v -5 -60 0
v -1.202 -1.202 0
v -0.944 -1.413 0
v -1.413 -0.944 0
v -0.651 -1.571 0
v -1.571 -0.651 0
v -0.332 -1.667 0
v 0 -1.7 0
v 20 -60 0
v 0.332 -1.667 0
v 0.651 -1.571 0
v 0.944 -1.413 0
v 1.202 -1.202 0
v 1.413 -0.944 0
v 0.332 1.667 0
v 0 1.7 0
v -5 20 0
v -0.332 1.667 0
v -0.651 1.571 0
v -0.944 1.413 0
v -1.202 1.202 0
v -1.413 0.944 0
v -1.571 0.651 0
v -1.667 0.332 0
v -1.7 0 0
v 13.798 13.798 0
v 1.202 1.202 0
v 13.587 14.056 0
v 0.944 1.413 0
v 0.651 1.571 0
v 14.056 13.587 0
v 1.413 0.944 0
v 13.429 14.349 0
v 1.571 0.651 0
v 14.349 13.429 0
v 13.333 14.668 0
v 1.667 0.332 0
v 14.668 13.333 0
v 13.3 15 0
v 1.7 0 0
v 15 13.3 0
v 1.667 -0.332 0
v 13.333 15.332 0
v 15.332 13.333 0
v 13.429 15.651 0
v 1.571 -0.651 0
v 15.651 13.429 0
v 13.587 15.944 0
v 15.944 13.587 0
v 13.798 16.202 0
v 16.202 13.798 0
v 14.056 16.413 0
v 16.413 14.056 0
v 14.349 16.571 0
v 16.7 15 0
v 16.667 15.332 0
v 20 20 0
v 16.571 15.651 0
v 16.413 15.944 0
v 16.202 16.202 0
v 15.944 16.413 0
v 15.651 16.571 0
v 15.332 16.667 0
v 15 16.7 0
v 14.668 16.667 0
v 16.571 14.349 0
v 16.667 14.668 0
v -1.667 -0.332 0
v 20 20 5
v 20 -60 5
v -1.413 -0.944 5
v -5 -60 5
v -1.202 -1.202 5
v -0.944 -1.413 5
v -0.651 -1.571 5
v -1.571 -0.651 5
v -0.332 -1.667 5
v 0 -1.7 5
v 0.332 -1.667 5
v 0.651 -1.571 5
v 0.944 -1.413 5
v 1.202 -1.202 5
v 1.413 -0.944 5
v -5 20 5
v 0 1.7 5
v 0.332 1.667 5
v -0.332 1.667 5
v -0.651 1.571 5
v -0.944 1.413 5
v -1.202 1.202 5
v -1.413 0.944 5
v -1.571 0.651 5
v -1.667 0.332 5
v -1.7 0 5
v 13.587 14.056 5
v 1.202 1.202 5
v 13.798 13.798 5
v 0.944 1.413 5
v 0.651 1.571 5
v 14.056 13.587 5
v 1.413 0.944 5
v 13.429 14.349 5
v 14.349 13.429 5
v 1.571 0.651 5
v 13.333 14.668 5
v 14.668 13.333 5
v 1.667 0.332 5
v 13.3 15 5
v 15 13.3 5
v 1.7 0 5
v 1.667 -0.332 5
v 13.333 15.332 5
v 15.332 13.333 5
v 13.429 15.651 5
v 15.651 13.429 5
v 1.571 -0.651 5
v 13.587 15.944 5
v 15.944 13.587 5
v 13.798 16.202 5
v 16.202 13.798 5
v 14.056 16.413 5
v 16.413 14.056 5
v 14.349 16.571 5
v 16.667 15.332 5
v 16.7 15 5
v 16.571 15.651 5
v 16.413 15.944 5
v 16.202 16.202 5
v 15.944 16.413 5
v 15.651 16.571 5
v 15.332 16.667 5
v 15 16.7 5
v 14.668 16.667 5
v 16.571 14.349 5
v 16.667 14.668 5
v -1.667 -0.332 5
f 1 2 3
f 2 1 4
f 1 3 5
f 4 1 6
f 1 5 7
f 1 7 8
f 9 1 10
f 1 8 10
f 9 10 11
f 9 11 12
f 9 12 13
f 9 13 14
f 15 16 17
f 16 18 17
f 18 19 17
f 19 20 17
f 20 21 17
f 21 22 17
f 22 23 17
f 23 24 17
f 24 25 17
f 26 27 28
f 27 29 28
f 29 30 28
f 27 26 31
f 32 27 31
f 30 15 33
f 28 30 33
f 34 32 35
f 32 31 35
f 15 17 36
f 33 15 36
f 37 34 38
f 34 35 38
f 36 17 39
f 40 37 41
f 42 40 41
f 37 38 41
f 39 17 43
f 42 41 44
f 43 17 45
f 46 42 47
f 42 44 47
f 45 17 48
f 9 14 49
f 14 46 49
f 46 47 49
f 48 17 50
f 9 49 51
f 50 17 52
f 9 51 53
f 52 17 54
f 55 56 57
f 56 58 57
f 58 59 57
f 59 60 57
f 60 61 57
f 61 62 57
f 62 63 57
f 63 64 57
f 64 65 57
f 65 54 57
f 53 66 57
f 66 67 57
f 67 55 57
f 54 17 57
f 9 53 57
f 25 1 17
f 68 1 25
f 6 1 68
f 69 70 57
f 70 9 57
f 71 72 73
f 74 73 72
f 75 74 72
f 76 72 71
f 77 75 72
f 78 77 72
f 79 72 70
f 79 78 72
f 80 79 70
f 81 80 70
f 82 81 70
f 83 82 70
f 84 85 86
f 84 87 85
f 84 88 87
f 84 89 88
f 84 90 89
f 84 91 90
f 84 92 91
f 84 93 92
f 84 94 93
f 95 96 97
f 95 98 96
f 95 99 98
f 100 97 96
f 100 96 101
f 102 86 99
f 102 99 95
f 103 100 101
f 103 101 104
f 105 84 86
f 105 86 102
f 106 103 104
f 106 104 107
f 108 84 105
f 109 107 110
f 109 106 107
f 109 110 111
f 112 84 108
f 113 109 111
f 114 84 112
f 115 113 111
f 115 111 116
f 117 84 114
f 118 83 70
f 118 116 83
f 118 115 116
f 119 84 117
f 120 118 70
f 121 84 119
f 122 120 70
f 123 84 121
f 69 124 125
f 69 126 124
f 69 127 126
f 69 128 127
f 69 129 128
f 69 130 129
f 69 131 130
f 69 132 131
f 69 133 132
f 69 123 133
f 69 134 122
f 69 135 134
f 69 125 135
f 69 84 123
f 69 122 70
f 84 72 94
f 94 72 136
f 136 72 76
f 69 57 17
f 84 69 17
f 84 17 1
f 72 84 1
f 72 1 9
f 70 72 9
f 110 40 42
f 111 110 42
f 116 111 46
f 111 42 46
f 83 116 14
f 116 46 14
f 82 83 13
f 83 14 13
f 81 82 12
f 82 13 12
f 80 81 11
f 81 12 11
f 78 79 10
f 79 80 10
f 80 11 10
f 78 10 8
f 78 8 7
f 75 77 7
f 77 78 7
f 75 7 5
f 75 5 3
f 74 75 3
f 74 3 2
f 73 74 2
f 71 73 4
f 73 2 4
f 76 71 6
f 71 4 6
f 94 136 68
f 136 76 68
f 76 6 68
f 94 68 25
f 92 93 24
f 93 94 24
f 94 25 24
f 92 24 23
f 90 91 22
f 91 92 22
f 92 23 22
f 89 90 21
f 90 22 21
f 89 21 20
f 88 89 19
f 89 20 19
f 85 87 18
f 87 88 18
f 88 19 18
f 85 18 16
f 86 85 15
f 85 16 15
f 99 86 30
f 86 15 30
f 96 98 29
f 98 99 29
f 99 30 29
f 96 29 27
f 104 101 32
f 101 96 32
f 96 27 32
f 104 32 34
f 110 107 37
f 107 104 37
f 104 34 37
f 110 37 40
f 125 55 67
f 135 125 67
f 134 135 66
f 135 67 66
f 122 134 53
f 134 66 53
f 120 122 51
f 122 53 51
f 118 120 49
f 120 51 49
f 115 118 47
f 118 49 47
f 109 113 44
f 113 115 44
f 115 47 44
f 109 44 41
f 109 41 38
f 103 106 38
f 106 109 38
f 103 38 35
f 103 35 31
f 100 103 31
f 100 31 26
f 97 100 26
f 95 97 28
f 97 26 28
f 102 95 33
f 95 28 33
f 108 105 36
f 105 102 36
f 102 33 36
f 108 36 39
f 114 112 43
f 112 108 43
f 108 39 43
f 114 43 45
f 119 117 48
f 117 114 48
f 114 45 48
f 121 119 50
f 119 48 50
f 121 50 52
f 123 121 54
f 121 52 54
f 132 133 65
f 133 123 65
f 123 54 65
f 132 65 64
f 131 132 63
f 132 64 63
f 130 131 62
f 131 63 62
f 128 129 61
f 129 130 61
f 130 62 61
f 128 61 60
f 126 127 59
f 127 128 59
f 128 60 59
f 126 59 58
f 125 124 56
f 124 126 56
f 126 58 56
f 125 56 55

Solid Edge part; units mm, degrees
sketch "Sketch1" plane through (0, 0, 0) normal (0, 0, 1) x (1, 0, 0)
  circle A0 centre (15, 15) radius 1.7
  line L0 (-5, -60) -> (20, -60)
  line L1 (20, -60) -> (20, 20)
  line L2 (20, 20) -> (-5, 20)
  line L3 (-5, 20) -> (-5, -60)
  circle A1 centre (0, 0) radius 1.7
  dimension "D1" = 15
  dimension "D2" = 15
  dimension "D3" = 3.4
  dimension "D4" = 3.4
  dimension "D5" = 5
  dimension "D6" = 5
  dimension "D7" = 5
  dimension "D8" = 80
extrude "Protrusion1" add sketch "Sketch1" along normal blind 5
properties material "Steel"
